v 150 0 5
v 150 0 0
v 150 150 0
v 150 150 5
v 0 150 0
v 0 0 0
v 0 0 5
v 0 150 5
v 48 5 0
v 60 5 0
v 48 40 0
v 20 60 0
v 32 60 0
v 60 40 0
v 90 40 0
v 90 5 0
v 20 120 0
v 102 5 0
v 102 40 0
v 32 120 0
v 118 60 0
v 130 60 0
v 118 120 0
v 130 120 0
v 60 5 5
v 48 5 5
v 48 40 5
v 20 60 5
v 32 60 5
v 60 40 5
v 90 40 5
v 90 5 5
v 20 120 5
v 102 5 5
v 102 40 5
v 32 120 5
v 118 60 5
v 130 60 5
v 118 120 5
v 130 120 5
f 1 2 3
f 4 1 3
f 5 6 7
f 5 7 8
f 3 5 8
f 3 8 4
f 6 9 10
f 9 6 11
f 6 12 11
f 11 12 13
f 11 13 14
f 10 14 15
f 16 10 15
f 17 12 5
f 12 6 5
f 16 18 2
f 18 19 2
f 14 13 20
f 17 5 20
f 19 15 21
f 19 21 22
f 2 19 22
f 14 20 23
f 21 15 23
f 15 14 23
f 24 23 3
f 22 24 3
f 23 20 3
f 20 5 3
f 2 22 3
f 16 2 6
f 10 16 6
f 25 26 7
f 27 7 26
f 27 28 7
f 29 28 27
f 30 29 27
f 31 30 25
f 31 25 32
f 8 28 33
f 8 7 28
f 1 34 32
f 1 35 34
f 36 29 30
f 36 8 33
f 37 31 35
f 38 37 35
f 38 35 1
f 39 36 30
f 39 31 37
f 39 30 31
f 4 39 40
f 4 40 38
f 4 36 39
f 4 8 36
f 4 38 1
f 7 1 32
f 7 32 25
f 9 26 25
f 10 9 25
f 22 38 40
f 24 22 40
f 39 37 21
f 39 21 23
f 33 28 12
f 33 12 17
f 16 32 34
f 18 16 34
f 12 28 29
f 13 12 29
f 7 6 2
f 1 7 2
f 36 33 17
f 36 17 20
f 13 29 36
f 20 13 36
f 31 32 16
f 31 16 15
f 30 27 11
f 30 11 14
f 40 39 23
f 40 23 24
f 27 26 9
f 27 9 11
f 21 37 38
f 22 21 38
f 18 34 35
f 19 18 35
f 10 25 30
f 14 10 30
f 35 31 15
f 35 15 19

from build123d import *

# Parameters (mm, degrees)
ESQUISSE1_W             = 150
ESQUISSE1_H             = 150
BOSS_EXTRU_1_DEPTH      = 5
ESQUISSE2_W             = 12
ESQUISSE2_H             = 60
ESQUISSE2_H_2           = 35
ENL_V_MAT_EXTRU_1_DEPTH = 5


with BuildPart() as part:
    # Esquisse1 → Boss.-Extru.1 (new body)
    with BuildSketch(Plane.XY):
        with Locations((75, 75)):
            Rectangle(ESQUISSE1_W, ESQUISSE1_H)
    extrude(amount=BOSS_EXTRU_1_DEPTH)

    # Esquisse2 → Enlèv. mat.-Extru.1 (cut)
    with BuildSketch(Plane.XY.offset(5)):
        with Locations((26, 90)):
            Rectangle(ESQUISSE2_W, ESQUISSE2_H)
        with Locations((124, 90)):
            Rectangle(ESQUISSE2_W, ESQUISSE2_H)
        with Locations((54, 22.5)):
            Rectangle(ESQUISSE2_W, ESQUISSE2_H_2)
        with Locations((96, 22.5)):
            Rectangle(ESQUISSE2_W, ESQUISSE2_H_2)
    extrude(amount=-ENL_V_MAT_EXTRU_1_DEPTH, mode=Mode.SUBTRACT)


solid = part.part
